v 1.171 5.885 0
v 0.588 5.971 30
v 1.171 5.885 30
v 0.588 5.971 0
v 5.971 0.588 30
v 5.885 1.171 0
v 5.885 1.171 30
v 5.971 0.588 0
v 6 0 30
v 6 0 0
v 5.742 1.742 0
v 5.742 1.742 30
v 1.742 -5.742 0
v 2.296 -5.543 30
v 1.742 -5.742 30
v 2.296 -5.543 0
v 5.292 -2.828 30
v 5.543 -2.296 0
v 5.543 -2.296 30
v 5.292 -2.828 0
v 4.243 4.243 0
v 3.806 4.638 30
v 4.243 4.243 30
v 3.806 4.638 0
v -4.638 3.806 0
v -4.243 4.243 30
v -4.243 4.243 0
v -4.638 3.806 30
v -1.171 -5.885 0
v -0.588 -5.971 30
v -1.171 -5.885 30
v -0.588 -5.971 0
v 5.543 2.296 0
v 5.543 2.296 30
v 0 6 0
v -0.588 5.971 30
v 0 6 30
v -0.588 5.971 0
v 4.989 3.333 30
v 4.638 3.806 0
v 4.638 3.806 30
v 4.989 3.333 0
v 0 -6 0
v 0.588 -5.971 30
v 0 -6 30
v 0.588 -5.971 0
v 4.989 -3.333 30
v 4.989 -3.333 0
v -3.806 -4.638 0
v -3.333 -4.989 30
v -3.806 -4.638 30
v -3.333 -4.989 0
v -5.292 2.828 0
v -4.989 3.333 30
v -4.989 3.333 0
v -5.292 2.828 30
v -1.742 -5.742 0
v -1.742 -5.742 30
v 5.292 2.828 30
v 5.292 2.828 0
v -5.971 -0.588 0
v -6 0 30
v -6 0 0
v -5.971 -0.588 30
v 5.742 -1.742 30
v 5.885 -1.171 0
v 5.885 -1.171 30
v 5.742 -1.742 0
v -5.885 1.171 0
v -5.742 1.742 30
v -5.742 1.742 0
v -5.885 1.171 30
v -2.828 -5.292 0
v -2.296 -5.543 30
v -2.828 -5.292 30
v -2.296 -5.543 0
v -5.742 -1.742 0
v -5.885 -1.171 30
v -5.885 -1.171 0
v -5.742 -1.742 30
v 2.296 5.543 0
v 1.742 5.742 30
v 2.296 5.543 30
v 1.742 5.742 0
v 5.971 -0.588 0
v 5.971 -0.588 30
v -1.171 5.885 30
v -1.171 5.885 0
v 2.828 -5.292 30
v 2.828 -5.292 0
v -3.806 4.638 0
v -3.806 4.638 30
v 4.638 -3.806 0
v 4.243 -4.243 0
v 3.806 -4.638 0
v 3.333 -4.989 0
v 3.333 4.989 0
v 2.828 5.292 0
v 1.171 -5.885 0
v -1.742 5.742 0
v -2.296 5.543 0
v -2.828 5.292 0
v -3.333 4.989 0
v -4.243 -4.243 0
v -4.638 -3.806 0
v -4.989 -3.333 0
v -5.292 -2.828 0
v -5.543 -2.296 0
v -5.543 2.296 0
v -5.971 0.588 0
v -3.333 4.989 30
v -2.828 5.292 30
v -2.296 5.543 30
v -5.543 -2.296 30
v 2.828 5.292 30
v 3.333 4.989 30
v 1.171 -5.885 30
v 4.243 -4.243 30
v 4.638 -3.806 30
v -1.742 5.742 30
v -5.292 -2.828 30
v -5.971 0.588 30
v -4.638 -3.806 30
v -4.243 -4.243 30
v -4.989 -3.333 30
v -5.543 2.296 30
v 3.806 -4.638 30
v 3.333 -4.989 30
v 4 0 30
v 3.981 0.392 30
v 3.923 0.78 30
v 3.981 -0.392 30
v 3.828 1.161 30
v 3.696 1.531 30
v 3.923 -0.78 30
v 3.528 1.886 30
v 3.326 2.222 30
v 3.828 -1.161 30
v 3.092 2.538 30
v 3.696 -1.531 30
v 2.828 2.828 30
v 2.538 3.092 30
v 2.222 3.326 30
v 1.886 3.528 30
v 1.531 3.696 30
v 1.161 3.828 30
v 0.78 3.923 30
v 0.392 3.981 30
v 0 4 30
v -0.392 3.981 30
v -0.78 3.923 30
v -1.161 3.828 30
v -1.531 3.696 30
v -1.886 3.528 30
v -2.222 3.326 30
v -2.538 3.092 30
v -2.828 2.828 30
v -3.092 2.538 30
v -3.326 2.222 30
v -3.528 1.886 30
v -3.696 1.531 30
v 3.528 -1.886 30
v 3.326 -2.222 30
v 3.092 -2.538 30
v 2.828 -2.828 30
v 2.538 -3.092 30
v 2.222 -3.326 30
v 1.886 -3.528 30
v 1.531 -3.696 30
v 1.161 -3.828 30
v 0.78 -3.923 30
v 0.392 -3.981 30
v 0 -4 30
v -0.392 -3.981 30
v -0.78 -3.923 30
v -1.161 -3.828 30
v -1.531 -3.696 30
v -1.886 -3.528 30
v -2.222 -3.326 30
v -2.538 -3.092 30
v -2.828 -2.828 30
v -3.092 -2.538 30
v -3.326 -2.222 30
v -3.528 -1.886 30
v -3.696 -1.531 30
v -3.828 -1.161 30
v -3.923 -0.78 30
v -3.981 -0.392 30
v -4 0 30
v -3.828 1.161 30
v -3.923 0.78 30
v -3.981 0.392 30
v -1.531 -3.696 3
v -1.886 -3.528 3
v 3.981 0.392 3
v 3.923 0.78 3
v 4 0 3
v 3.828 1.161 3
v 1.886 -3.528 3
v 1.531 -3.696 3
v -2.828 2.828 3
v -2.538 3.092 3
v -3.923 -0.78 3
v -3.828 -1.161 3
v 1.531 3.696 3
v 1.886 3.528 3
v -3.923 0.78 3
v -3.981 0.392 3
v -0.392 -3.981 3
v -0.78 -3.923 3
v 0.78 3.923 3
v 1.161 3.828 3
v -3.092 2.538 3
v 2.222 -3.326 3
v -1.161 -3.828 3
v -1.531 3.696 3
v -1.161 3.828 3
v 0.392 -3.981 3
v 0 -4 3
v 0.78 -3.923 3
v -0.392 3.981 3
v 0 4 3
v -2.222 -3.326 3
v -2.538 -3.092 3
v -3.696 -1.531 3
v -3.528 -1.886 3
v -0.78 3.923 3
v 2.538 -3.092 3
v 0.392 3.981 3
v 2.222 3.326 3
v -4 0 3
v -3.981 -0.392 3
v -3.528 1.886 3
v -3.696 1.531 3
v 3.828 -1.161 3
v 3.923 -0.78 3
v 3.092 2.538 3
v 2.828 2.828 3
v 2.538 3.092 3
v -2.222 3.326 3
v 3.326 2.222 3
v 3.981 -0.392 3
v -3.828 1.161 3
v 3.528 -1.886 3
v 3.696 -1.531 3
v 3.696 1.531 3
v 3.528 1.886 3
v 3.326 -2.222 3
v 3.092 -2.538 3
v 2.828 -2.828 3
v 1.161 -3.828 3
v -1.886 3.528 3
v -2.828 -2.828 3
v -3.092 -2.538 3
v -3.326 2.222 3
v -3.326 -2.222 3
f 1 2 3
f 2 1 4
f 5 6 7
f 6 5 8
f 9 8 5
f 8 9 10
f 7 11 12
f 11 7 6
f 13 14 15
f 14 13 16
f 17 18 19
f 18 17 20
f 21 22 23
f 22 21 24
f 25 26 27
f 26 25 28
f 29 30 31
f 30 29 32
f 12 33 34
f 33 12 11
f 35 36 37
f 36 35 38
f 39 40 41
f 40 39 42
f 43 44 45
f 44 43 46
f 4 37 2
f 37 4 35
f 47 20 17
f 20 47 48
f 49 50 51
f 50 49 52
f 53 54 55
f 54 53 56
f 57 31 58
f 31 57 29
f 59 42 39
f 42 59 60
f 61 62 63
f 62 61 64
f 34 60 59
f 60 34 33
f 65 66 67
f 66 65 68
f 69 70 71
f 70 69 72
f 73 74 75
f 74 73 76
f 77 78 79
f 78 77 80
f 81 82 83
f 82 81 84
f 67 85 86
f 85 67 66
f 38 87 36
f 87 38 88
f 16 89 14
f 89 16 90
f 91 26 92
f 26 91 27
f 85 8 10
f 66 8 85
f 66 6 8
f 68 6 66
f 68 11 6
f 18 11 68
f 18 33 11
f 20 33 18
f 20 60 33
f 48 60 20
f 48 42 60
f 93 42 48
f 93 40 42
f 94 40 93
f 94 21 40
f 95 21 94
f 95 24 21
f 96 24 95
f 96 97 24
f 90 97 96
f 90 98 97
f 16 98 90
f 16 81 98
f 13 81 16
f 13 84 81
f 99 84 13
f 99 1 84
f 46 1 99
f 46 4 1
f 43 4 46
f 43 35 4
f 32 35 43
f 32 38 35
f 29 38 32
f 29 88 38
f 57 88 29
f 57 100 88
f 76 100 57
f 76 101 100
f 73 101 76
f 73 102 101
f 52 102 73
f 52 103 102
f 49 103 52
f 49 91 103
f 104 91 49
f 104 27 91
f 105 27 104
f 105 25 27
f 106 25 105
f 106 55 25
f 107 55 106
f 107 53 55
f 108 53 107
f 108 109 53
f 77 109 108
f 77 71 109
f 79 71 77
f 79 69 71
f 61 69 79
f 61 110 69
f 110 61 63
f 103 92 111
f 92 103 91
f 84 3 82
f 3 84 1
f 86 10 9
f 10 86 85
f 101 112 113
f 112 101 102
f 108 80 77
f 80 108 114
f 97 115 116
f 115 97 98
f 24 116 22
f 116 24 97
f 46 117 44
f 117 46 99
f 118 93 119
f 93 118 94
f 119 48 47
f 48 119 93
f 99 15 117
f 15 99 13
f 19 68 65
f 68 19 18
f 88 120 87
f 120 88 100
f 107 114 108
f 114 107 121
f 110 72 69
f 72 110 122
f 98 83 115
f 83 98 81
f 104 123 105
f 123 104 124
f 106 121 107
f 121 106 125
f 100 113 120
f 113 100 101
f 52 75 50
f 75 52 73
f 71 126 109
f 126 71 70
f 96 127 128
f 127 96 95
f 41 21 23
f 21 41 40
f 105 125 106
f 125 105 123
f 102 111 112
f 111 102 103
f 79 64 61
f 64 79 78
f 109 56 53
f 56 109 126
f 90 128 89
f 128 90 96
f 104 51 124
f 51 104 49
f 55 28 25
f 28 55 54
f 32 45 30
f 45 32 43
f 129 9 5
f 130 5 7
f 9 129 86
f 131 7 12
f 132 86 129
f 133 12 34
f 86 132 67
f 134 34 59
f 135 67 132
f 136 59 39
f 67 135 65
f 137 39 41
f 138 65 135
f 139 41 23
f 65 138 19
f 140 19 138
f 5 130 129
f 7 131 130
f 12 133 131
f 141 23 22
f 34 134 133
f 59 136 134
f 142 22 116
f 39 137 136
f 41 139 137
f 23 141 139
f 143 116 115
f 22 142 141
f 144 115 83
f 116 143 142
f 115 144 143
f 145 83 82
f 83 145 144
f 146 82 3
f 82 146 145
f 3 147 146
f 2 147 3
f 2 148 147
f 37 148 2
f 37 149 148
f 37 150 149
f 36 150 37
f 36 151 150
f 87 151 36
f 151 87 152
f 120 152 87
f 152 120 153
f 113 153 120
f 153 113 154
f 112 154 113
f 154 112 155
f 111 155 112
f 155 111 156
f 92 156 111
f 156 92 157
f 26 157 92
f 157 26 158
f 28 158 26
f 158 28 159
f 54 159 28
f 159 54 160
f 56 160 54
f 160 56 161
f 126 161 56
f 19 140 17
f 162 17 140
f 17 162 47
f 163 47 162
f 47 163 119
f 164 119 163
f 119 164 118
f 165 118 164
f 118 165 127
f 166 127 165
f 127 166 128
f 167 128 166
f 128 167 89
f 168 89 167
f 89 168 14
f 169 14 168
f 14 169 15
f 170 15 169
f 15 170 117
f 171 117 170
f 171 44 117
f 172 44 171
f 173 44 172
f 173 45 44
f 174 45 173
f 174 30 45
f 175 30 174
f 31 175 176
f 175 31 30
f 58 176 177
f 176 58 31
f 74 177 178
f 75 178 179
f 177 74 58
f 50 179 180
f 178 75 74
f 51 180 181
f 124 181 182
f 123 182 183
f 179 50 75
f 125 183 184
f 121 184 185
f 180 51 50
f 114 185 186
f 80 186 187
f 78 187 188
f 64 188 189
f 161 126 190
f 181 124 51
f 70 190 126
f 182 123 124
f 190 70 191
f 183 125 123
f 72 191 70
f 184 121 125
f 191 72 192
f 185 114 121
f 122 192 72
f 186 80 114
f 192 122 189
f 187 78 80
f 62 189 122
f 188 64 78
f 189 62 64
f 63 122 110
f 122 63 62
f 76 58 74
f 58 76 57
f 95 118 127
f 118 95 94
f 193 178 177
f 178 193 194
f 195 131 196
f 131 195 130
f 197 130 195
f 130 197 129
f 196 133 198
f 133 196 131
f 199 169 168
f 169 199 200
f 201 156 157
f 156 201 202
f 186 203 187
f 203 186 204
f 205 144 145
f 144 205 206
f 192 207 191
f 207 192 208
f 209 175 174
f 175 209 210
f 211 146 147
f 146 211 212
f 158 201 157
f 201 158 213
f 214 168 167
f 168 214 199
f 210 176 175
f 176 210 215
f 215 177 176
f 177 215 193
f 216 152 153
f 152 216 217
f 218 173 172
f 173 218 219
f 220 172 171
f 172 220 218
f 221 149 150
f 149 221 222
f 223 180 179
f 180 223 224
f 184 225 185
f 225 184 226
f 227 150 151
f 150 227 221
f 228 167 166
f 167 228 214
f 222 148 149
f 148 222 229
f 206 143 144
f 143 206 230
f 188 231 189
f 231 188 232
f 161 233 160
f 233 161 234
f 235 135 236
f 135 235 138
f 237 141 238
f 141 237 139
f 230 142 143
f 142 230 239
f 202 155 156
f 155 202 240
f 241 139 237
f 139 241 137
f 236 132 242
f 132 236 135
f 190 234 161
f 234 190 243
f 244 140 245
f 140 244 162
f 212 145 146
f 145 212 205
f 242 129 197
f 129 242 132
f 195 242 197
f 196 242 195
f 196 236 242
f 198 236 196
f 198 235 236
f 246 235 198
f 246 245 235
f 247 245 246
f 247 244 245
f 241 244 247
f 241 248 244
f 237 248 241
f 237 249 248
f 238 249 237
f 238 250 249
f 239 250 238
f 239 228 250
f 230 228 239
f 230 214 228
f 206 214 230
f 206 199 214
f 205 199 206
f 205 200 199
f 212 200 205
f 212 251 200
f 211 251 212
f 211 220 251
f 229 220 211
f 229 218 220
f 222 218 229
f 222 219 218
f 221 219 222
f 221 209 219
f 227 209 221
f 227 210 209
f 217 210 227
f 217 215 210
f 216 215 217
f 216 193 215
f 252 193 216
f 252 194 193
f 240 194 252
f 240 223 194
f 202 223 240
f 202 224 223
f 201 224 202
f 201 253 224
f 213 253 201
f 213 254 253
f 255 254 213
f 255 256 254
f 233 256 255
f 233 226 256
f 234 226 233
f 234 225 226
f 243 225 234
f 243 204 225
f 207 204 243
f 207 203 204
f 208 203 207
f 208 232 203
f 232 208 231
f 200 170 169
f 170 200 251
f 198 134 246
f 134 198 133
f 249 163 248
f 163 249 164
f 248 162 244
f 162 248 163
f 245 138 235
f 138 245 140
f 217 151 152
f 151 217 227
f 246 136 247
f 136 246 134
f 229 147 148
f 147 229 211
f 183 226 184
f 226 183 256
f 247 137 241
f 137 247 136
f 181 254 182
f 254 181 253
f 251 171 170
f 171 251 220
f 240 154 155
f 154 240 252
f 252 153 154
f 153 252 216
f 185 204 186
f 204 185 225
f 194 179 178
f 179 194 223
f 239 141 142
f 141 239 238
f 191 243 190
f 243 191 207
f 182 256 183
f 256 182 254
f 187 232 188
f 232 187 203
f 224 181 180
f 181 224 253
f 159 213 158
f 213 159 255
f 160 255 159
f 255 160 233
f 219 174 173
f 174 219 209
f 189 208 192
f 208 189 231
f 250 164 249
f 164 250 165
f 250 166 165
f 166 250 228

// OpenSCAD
$fn=64;
h=30;

difference(){
    cylinder(d=12,h=h);

    translate([0,0,3])
    cylinder(d=8,h=h);
}    
